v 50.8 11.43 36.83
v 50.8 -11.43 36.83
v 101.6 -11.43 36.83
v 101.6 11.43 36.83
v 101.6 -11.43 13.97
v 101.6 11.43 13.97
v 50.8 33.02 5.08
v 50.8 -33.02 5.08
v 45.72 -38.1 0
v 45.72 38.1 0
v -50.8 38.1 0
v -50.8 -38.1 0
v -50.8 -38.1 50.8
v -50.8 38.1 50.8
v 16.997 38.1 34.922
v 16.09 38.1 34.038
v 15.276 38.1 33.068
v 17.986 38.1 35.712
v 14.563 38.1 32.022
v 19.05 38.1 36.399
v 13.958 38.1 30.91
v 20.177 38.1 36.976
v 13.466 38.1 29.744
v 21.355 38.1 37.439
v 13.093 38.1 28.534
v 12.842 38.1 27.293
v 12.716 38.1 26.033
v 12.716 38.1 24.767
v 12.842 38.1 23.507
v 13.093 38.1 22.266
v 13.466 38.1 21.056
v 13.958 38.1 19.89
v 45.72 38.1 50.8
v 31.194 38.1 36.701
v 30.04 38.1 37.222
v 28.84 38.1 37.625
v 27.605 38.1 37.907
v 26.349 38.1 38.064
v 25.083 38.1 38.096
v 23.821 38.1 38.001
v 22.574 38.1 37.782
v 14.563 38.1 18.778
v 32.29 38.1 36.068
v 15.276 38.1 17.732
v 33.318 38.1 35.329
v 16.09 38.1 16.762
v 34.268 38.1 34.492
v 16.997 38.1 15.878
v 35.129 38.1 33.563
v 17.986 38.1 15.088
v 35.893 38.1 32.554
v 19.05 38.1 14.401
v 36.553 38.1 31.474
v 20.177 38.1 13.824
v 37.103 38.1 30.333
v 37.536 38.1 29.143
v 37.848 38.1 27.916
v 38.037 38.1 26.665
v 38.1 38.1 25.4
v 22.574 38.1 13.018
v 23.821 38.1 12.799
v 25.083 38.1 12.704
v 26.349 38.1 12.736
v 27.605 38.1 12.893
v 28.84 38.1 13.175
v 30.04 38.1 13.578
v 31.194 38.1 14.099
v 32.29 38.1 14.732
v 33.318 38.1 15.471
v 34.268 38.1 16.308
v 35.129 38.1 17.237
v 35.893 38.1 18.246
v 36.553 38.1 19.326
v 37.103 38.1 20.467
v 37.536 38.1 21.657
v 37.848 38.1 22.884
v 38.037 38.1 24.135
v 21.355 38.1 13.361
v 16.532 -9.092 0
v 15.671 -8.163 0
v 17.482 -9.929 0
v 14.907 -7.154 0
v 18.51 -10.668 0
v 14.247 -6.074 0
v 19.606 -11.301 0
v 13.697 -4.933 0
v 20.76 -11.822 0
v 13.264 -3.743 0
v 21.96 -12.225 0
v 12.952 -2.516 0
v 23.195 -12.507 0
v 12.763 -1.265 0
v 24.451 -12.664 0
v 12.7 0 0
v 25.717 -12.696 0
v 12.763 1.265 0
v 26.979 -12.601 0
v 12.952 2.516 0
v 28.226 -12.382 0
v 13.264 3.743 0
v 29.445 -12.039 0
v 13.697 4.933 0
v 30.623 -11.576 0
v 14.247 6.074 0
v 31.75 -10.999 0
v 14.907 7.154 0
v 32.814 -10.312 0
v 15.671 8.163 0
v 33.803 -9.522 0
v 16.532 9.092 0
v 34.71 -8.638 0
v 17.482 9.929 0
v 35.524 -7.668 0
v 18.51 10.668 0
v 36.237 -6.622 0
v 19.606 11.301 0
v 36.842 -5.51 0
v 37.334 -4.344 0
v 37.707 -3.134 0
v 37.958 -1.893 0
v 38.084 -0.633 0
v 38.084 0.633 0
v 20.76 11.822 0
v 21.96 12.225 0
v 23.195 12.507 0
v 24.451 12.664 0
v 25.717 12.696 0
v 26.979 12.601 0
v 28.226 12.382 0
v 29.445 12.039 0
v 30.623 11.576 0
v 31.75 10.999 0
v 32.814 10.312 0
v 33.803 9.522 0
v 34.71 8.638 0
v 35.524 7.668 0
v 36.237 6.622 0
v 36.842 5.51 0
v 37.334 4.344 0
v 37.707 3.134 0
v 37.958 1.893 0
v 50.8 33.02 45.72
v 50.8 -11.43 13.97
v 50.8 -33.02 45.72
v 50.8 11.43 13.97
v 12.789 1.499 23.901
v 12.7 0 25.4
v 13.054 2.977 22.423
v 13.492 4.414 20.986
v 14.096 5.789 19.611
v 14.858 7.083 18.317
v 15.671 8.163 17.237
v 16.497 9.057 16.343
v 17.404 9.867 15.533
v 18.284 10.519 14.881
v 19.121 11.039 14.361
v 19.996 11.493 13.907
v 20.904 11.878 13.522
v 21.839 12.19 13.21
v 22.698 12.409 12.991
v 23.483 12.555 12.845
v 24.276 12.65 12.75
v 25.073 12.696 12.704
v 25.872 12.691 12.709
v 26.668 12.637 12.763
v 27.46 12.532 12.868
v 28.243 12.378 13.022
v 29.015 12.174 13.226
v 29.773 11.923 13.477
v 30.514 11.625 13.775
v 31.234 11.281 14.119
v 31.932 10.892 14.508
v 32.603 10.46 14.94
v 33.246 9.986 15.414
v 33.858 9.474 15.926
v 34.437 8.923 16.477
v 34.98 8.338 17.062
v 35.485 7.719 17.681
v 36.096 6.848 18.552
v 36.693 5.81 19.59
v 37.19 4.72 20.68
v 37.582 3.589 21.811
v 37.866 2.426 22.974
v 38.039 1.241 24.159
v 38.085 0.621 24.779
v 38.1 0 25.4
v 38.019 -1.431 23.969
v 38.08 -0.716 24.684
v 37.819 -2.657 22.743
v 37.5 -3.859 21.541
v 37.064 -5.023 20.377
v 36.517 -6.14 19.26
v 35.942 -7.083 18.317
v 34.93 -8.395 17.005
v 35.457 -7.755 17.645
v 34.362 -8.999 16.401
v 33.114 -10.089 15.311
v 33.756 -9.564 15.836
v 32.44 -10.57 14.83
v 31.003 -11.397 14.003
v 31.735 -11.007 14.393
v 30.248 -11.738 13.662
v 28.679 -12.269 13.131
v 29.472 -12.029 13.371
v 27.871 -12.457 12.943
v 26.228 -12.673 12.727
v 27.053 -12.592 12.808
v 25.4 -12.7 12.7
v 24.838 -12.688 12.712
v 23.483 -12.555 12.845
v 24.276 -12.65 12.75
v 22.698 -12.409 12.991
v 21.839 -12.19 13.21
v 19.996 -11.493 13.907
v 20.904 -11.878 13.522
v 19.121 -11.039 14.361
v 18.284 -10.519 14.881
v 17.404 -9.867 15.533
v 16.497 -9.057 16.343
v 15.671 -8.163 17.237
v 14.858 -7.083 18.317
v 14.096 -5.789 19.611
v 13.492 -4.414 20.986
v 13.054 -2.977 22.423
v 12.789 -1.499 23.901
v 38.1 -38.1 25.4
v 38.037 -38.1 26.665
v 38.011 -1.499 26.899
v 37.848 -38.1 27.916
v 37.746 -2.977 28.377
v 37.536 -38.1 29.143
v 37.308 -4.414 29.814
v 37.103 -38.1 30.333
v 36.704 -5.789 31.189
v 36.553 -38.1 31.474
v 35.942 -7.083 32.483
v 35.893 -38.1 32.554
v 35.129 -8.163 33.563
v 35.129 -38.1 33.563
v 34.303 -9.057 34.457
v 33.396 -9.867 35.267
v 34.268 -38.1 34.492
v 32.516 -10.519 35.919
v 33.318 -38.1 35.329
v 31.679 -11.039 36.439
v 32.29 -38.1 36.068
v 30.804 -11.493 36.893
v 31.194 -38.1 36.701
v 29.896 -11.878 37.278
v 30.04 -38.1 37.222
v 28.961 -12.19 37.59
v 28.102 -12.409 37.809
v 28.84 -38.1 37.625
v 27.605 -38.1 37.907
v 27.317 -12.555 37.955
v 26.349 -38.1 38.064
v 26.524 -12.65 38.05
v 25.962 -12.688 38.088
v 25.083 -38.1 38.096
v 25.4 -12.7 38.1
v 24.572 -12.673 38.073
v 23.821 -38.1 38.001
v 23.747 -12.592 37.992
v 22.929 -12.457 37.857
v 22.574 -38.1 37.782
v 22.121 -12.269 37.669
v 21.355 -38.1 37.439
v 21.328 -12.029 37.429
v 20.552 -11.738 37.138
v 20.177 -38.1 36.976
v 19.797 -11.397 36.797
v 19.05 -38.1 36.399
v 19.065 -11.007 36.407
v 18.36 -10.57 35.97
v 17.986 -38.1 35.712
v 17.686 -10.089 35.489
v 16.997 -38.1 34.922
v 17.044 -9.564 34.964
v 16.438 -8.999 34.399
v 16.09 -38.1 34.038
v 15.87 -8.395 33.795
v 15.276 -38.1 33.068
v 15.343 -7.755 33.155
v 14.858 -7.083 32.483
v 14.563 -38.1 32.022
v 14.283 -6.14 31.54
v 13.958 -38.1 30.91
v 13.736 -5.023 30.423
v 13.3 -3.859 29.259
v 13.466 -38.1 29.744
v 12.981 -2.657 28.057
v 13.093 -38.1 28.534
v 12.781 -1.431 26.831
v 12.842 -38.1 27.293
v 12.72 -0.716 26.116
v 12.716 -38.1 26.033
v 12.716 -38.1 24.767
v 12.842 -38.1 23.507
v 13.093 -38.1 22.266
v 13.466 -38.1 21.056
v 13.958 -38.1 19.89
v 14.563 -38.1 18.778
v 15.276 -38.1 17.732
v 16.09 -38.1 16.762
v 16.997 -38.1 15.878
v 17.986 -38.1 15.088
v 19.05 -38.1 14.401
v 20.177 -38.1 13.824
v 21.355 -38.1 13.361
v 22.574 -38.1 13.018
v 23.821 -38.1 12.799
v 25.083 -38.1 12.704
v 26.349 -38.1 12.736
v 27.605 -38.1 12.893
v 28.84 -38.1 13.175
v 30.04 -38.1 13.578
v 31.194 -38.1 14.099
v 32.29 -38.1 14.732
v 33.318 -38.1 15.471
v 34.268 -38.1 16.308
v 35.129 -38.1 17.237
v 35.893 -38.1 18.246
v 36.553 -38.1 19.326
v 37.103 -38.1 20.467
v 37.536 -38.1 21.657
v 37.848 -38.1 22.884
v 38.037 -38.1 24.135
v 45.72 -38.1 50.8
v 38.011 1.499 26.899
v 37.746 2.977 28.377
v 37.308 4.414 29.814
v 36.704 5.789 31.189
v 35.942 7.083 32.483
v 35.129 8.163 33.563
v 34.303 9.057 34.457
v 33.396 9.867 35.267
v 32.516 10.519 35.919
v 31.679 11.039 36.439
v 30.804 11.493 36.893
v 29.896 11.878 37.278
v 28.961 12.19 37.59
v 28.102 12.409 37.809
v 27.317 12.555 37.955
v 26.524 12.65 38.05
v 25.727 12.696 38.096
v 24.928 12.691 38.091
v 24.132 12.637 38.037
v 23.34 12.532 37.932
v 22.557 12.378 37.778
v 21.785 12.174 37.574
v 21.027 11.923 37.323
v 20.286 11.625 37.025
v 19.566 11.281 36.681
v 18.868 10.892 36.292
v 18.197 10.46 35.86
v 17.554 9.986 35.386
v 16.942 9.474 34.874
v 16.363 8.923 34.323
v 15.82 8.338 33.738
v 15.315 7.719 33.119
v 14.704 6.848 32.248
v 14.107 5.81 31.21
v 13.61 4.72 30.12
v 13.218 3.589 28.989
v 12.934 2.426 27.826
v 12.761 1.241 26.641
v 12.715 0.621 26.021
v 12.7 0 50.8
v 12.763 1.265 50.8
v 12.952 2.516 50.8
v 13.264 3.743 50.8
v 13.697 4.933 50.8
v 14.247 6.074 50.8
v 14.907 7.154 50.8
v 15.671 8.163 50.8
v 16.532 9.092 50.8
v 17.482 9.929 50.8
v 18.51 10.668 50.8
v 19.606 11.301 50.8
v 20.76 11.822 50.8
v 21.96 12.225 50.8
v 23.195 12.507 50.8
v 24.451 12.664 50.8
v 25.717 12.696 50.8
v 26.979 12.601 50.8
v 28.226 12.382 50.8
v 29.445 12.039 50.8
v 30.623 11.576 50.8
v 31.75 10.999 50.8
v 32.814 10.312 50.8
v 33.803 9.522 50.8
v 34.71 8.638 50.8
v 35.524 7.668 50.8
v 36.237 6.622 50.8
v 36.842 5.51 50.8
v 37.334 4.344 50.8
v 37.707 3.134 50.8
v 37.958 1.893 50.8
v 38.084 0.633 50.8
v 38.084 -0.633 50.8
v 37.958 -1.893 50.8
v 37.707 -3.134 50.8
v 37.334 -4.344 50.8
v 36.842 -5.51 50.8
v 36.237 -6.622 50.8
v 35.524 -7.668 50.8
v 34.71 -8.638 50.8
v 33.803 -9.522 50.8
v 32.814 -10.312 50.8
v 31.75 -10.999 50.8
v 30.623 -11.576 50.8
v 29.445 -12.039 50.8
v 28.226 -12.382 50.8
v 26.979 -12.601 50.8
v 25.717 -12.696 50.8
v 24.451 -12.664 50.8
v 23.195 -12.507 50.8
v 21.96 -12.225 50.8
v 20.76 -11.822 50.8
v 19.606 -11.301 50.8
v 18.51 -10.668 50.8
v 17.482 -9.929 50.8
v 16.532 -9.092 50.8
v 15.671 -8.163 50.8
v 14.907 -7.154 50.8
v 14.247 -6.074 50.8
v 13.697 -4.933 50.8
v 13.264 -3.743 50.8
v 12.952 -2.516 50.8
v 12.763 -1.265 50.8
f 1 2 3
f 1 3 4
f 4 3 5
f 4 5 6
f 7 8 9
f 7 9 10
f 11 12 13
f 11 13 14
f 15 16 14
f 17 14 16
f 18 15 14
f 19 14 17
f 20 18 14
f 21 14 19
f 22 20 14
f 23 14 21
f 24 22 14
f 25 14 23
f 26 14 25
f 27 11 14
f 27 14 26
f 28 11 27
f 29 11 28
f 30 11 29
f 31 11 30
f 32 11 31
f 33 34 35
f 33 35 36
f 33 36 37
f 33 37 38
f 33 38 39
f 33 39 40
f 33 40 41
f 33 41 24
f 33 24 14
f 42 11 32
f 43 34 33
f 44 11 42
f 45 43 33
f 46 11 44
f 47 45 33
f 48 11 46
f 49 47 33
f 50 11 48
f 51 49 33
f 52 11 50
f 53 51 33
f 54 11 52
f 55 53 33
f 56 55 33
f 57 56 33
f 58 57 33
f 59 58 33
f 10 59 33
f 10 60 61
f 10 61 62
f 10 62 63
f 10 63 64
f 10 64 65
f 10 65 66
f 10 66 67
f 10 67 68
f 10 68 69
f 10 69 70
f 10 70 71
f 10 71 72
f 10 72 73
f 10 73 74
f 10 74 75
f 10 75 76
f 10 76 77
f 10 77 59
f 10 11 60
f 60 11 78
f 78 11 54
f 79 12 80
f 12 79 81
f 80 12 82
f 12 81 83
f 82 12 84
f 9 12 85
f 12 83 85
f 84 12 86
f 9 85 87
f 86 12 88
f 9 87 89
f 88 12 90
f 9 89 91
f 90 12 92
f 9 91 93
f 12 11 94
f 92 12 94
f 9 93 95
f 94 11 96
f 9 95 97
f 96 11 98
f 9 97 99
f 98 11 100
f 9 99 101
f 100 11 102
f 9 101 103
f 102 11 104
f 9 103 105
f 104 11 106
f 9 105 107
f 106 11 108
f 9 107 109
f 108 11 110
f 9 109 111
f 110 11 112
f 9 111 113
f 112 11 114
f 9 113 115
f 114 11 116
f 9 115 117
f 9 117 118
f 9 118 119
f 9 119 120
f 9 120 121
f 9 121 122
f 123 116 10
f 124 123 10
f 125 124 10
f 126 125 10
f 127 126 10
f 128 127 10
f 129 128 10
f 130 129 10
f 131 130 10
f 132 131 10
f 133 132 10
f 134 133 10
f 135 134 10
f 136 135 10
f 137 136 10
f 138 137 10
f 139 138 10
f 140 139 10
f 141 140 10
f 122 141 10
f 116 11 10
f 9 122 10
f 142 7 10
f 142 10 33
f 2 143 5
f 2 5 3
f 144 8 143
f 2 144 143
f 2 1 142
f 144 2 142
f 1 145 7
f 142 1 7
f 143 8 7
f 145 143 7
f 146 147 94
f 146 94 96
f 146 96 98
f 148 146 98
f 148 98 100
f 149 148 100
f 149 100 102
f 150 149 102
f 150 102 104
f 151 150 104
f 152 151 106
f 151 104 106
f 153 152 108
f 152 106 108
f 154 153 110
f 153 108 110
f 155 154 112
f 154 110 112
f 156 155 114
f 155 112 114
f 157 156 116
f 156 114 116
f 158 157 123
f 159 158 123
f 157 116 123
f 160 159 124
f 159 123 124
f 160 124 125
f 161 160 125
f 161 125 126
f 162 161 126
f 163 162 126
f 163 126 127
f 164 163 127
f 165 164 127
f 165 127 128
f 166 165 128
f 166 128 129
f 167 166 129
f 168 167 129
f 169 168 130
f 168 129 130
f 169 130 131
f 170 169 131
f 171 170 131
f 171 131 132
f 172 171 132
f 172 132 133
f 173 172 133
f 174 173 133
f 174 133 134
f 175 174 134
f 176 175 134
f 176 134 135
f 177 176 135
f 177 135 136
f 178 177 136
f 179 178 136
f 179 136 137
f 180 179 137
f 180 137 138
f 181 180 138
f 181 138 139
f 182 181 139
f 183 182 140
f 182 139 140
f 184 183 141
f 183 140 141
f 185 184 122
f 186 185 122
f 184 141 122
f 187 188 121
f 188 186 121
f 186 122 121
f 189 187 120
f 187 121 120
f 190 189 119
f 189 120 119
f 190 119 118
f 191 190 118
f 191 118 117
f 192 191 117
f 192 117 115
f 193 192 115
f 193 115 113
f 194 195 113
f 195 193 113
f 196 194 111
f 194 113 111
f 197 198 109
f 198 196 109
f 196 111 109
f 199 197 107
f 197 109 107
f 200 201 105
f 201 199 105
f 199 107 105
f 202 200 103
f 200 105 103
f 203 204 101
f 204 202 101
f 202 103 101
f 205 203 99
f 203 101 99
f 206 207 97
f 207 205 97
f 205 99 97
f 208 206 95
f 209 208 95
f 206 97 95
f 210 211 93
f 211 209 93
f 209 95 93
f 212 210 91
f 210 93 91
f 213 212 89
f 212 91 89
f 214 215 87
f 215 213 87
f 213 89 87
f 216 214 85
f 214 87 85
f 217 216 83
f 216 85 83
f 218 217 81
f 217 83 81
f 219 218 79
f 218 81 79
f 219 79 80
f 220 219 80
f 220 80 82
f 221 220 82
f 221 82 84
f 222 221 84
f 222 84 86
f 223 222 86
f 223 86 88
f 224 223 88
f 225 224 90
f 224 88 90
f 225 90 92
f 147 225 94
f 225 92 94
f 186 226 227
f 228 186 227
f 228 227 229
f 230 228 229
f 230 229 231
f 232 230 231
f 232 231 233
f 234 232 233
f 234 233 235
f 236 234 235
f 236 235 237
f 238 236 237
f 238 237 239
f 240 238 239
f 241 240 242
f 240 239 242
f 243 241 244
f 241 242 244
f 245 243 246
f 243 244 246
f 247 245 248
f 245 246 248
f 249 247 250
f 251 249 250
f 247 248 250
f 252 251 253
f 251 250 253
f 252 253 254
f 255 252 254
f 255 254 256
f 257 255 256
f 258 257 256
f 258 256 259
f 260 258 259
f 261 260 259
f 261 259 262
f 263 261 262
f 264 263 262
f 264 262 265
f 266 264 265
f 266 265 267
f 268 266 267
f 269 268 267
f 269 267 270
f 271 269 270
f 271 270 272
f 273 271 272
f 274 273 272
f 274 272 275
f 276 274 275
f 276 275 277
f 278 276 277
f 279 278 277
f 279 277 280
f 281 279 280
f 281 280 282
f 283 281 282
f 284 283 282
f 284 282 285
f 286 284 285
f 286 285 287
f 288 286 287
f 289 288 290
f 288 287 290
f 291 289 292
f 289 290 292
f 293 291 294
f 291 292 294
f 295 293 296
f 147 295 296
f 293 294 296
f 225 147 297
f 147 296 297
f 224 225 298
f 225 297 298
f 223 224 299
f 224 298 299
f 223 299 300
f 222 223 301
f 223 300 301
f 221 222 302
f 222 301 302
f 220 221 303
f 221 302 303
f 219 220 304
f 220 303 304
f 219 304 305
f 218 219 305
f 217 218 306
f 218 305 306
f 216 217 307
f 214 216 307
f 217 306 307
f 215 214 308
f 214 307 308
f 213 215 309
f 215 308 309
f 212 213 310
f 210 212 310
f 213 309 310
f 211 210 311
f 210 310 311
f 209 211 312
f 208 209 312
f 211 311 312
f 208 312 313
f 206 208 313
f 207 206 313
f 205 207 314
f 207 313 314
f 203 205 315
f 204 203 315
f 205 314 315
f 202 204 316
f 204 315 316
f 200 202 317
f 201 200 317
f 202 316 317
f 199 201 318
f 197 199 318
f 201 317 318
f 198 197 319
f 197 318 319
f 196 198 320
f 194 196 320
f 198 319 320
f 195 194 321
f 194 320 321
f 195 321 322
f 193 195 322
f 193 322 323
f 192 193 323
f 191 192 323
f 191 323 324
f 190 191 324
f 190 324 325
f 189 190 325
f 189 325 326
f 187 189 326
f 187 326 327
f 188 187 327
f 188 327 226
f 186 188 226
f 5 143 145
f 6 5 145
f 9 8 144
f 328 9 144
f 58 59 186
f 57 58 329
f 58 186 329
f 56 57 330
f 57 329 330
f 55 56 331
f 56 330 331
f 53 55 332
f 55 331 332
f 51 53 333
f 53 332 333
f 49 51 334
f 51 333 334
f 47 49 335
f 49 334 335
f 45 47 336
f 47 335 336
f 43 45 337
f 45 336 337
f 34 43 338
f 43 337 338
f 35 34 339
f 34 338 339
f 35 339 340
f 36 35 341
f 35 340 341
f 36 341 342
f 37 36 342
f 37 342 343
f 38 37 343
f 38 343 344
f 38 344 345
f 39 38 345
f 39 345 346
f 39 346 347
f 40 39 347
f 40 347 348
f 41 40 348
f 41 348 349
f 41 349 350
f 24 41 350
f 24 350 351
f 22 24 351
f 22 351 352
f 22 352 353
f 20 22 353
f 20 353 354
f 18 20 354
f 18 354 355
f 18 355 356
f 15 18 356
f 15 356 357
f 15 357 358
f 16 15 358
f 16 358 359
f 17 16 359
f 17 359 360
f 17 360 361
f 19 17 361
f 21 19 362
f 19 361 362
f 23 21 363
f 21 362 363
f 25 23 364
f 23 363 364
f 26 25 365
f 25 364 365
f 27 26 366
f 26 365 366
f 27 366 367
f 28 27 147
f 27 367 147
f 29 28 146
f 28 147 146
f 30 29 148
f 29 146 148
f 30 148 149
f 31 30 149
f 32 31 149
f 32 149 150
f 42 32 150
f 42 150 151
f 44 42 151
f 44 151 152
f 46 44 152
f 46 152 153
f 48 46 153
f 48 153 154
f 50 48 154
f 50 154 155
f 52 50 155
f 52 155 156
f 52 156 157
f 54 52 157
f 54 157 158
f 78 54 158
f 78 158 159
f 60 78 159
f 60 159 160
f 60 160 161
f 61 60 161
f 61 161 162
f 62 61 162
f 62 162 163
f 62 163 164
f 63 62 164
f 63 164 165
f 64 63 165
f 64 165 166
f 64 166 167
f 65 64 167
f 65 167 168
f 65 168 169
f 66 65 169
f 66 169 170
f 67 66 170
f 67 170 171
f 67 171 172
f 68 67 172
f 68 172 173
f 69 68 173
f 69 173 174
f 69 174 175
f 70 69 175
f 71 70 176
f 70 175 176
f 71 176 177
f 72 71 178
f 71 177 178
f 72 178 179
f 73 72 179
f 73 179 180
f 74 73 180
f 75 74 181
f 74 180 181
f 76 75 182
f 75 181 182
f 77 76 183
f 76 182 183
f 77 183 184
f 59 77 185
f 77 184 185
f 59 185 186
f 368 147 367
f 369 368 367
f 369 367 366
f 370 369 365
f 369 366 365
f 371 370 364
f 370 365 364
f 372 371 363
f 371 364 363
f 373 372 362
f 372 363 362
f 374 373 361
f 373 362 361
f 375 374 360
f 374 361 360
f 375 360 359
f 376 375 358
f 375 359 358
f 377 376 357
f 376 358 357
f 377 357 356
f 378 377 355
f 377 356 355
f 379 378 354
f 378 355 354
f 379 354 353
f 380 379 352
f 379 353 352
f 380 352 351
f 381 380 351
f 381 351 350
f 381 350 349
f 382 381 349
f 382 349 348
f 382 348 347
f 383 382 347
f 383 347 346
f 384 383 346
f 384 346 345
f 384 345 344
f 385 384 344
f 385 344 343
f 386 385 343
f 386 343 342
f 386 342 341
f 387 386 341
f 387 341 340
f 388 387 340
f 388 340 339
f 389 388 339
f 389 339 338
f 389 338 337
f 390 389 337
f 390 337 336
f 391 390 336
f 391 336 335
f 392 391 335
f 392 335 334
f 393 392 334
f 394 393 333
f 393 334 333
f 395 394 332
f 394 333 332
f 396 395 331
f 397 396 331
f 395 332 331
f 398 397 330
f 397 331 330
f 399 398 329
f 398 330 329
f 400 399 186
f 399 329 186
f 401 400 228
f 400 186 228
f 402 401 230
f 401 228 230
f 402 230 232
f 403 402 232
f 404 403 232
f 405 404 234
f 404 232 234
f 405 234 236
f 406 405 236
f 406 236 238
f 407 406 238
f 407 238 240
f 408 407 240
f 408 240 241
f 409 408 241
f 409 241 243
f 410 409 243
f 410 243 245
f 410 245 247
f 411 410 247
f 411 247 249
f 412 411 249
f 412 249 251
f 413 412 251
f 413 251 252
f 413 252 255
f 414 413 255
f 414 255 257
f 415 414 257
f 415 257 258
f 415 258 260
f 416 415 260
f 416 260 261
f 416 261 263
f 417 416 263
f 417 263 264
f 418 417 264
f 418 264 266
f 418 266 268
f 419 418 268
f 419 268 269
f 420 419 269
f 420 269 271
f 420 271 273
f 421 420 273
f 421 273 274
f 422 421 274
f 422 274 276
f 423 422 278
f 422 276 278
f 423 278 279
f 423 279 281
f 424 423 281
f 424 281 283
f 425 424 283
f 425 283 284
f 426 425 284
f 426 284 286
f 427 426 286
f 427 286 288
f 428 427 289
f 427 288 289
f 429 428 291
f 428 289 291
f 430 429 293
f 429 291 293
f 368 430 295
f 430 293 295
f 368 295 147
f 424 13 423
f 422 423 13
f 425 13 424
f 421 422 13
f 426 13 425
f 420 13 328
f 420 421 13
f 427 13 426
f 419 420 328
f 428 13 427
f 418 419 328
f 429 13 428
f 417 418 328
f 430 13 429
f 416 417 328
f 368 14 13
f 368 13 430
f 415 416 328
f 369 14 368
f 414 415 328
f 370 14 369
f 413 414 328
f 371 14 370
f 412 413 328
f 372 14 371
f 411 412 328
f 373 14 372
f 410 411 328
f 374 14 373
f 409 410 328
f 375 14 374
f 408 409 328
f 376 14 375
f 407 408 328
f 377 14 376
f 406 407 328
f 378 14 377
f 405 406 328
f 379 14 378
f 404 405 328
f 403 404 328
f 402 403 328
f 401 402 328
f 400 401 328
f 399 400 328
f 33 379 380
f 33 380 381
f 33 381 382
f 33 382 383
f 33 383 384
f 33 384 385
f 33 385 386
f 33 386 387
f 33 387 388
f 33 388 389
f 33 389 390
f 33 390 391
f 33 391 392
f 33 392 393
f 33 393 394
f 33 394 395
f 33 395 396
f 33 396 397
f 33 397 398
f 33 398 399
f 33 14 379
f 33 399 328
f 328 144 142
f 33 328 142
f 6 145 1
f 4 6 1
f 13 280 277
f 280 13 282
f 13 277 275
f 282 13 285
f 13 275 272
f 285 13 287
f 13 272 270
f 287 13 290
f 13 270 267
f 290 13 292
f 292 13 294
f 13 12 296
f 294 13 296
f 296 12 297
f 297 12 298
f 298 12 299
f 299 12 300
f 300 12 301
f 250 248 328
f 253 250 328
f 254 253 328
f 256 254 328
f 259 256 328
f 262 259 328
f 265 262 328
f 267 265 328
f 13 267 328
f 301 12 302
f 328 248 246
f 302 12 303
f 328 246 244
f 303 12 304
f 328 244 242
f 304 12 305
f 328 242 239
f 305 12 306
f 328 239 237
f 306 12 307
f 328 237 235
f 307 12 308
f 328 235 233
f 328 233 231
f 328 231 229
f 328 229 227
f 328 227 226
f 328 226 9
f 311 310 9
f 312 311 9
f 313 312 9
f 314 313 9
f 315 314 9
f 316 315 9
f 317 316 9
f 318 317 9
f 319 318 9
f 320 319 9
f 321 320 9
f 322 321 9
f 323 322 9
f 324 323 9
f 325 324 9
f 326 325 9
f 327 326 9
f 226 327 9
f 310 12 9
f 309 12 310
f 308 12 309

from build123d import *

# Parameters (mm, degrees)
F0_W     = 101.6
F0_H     = 76.2
F1_DEPTH = 50.8
F4_D     = 25.4
F5_D     = 25.4
F6_W     = 22.86
F6_H     = 22.86
F7_DEPTH = 50.8
F8_SIZE  = 5.08


with BuildPart() as f1:
    # F0 (on Top) → F1 (new body)
    with BuildSketch(Plane.XY):
        Rectangle(F0_W, F0_H)
    extrude(amount=F1_DEPTH)

    # F4 (through all)
    with Locations(Plane(origin=(0, 38.1, 0), x_dir=(-1, 0, 0), z_dir=(0, 1, 0))):
        with Locations((-25.4, 25.4)):
            Hole(F4_D / 2)

    # F5 (through all)
    with Locations(Plane.XY.offset(50.8)):
        with Locations((25.4, 0)):
            Hole(F5_D / 2)

    # F6 (on face) → F7 (join)
    with BuildSketch(Plane.YZ.offset(50.8)):
        with Locations((0, 25.4)):
            Rectangle(F6_W, F6_H)
    extrude(amount=F7_DEPTH)

    # F8
    f8_edges = [f1.edges().sort_by_distance(p)[0] for p in [
        (50.8, 0, 50.8),
        (50.8, -38.1, 25.4),
        (50.8, 0, 0),
        (50.8, 38.1, 25.4),
    ]]
    chamfer(f8_edges, length=F8_SIZE)


solid = f1.part
